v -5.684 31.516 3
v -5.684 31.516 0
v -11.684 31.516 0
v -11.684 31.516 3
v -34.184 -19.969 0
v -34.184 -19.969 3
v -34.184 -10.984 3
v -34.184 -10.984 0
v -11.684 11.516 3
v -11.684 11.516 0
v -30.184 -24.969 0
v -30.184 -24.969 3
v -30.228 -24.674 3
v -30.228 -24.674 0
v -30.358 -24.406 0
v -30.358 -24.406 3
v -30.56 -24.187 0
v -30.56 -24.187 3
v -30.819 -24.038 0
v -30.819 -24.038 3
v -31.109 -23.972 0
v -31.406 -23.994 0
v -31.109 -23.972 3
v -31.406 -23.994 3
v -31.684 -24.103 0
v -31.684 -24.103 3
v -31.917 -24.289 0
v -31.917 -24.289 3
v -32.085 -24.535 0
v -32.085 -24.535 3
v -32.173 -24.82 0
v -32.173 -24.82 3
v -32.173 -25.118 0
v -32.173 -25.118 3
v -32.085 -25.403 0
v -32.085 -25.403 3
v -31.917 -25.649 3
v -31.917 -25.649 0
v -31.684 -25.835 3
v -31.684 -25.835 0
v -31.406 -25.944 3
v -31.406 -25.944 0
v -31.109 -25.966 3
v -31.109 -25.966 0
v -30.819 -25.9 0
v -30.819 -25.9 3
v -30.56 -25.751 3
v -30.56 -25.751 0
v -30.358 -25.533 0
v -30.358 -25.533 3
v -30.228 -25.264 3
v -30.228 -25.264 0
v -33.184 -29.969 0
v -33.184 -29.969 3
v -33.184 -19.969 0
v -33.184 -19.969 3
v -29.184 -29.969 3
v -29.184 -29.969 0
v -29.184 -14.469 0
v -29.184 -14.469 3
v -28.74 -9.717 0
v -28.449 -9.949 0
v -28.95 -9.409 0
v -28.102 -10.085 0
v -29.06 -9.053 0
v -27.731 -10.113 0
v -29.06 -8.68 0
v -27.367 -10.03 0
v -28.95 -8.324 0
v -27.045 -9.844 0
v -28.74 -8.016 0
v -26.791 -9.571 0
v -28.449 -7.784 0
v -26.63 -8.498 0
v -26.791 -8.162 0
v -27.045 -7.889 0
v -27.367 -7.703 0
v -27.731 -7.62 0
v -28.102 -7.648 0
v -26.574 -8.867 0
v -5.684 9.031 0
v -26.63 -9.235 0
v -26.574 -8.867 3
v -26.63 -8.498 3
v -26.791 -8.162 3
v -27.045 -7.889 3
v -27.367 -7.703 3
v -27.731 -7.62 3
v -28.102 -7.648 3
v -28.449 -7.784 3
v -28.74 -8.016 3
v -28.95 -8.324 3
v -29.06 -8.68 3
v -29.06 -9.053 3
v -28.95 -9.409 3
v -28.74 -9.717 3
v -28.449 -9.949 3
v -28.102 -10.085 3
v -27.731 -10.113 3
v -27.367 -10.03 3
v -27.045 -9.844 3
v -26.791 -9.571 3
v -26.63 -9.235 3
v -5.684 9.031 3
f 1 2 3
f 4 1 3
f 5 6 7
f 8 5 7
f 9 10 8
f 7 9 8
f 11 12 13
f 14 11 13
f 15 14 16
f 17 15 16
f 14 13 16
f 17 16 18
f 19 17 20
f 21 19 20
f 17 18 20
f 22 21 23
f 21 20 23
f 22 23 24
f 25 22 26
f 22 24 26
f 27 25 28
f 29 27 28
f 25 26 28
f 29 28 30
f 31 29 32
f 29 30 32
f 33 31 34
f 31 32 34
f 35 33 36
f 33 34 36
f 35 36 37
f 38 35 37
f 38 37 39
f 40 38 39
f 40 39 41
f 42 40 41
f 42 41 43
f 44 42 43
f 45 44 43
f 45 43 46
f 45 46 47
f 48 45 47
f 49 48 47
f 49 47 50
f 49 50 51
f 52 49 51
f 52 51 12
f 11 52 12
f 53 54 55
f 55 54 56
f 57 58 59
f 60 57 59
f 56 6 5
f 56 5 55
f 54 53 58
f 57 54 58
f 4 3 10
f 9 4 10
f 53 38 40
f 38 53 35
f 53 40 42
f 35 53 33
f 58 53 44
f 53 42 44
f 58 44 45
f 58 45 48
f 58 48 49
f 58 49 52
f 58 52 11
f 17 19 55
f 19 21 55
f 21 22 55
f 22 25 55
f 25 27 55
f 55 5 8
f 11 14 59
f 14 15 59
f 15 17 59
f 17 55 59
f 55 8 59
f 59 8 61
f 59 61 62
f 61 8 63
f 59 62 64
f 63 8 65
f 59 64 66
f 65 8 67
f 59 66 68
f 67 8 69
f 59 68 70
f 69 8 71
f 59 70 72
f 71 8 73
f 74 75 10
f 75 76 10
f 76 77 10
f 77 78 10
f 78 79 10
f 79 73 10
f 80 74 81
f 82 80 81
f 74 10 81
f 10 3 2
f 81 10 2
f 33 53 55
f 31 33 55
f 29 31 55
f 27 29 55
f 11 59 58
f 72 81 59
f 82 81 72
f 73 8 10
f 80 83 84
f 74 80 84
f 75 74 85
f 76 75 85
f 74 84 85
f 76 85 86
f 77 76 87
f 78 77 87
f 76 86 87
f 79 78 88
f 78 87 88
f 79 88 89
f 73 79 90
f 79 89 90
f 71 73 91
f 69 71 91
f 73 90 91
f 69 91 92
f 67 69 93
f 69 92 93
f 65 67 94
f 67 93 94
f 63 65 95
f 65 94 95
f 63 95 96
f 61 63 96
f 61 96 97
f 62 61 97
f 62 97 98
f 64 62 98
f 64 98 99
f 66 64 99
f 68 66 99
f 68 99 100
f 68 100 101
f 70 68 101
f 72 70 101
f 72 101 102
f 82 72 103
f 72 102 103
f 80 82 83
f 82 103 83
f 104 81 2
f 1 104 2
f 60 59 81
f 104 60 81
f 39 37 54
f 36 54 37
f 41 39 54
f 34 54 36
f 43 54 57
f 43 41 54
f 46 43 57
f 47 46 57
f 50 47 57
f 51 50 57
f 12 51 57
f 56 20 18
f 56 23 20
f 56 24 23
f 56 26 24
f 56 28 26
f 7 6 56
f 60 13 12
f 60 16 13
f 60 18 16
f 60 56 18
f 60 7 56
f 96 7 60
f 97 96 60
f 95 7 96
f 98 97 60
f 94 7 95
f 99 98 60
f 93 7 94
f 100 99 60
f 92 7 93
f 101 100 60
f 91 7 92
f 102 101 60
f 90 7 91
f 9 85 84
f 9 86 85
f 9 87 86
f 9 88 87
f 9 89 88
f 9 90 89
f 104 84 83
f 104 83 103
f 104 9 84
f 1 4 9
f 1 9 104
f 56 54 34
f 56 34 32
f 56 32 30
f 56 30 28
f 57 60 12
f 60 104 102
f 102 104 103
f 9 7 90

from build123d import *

# Parameters (mm, degrees)
BOSS_EXTRUDE1_DEPTH = 3
SKETCH3_W           = 2
SKETCH3_H           = 10
CUT_EXTRUDE2_DEPTH  = 3
SKETCH5_W           = 1
SKETCH5_H           = 12.104258702
CUT_EXTRUDE4_DEPTH  = 10
SKETCH6_R           = 1.25
CUT_EXTRUDE5_DEPTH  = 3
SKETCH7_R           = 1
CUT_EXTRUDE6_DEPTH  = 10


with BuildPart() as part:
    # Sketch1 → Boss-Extrude1 (new body)
    with BuildSketch(Plane.XY):
        Polygon((-29.183975781, -29.96919486), (-29.183975781, -14.46919486), (-5.683975781, 9.03080514), (-5.683975781, 31.516086514), (-11.683975781, 31.516086514), (-11.683975781, 11.516086514), (-35.183975781, -11.983913486), (-35.183975781, -29.96919486), align=None)
    extrude(amount=BOSS_EXTRUDE1_DEPTH)

    # Sketch3 → Cut-Extrude2 (cut)
    with BuildSketch(Plane.XY.offset(3)):
        with Locations((-34.183975781, -24.96919486)):
            Rectangle(SKETCH3_W, SKETCH3_H)
    extrude(amount=-CUT_EXTRUDE2_DEPTH, mode=Mode.SUBTRACT)

    # Sketch5 → Cut-Extrude4 (cut)
    with BuildSketch(Plane.XY.offset(3)):
        with Locations((-34.683975781, -13.917065509)):
            Rectangle(SKETCH5_W, SKETCH5_H)
    extrude(amount=-CUT_EXTRUDE4_DEPTH, mode=Mode.SUBTRACT)

    # Sketch6 → Cut-Extrude5 (cut)
    with BuildSketch(Plane.XY.offset(3)):
        with Locations((-27.823975781, -8.866554173)):
            Circle(SKETCH6_R)
    extrude(amount=-CUT_EXTRUDE5_DEPTH, mode=Mode.SUBTRACT)

    # Sketch7 → Cut-Extrude6 (cut)
    with BuildSketch(Plane.XY.offset(3)):
        with Locations((-31.183975781, -24.96919486)):
            Circle(SKETCH7_R)
    extrude(amount=-CUT_EXTRUDE6_DEPTH, mode=Mode.SUBTRACT)


solid = part.part
